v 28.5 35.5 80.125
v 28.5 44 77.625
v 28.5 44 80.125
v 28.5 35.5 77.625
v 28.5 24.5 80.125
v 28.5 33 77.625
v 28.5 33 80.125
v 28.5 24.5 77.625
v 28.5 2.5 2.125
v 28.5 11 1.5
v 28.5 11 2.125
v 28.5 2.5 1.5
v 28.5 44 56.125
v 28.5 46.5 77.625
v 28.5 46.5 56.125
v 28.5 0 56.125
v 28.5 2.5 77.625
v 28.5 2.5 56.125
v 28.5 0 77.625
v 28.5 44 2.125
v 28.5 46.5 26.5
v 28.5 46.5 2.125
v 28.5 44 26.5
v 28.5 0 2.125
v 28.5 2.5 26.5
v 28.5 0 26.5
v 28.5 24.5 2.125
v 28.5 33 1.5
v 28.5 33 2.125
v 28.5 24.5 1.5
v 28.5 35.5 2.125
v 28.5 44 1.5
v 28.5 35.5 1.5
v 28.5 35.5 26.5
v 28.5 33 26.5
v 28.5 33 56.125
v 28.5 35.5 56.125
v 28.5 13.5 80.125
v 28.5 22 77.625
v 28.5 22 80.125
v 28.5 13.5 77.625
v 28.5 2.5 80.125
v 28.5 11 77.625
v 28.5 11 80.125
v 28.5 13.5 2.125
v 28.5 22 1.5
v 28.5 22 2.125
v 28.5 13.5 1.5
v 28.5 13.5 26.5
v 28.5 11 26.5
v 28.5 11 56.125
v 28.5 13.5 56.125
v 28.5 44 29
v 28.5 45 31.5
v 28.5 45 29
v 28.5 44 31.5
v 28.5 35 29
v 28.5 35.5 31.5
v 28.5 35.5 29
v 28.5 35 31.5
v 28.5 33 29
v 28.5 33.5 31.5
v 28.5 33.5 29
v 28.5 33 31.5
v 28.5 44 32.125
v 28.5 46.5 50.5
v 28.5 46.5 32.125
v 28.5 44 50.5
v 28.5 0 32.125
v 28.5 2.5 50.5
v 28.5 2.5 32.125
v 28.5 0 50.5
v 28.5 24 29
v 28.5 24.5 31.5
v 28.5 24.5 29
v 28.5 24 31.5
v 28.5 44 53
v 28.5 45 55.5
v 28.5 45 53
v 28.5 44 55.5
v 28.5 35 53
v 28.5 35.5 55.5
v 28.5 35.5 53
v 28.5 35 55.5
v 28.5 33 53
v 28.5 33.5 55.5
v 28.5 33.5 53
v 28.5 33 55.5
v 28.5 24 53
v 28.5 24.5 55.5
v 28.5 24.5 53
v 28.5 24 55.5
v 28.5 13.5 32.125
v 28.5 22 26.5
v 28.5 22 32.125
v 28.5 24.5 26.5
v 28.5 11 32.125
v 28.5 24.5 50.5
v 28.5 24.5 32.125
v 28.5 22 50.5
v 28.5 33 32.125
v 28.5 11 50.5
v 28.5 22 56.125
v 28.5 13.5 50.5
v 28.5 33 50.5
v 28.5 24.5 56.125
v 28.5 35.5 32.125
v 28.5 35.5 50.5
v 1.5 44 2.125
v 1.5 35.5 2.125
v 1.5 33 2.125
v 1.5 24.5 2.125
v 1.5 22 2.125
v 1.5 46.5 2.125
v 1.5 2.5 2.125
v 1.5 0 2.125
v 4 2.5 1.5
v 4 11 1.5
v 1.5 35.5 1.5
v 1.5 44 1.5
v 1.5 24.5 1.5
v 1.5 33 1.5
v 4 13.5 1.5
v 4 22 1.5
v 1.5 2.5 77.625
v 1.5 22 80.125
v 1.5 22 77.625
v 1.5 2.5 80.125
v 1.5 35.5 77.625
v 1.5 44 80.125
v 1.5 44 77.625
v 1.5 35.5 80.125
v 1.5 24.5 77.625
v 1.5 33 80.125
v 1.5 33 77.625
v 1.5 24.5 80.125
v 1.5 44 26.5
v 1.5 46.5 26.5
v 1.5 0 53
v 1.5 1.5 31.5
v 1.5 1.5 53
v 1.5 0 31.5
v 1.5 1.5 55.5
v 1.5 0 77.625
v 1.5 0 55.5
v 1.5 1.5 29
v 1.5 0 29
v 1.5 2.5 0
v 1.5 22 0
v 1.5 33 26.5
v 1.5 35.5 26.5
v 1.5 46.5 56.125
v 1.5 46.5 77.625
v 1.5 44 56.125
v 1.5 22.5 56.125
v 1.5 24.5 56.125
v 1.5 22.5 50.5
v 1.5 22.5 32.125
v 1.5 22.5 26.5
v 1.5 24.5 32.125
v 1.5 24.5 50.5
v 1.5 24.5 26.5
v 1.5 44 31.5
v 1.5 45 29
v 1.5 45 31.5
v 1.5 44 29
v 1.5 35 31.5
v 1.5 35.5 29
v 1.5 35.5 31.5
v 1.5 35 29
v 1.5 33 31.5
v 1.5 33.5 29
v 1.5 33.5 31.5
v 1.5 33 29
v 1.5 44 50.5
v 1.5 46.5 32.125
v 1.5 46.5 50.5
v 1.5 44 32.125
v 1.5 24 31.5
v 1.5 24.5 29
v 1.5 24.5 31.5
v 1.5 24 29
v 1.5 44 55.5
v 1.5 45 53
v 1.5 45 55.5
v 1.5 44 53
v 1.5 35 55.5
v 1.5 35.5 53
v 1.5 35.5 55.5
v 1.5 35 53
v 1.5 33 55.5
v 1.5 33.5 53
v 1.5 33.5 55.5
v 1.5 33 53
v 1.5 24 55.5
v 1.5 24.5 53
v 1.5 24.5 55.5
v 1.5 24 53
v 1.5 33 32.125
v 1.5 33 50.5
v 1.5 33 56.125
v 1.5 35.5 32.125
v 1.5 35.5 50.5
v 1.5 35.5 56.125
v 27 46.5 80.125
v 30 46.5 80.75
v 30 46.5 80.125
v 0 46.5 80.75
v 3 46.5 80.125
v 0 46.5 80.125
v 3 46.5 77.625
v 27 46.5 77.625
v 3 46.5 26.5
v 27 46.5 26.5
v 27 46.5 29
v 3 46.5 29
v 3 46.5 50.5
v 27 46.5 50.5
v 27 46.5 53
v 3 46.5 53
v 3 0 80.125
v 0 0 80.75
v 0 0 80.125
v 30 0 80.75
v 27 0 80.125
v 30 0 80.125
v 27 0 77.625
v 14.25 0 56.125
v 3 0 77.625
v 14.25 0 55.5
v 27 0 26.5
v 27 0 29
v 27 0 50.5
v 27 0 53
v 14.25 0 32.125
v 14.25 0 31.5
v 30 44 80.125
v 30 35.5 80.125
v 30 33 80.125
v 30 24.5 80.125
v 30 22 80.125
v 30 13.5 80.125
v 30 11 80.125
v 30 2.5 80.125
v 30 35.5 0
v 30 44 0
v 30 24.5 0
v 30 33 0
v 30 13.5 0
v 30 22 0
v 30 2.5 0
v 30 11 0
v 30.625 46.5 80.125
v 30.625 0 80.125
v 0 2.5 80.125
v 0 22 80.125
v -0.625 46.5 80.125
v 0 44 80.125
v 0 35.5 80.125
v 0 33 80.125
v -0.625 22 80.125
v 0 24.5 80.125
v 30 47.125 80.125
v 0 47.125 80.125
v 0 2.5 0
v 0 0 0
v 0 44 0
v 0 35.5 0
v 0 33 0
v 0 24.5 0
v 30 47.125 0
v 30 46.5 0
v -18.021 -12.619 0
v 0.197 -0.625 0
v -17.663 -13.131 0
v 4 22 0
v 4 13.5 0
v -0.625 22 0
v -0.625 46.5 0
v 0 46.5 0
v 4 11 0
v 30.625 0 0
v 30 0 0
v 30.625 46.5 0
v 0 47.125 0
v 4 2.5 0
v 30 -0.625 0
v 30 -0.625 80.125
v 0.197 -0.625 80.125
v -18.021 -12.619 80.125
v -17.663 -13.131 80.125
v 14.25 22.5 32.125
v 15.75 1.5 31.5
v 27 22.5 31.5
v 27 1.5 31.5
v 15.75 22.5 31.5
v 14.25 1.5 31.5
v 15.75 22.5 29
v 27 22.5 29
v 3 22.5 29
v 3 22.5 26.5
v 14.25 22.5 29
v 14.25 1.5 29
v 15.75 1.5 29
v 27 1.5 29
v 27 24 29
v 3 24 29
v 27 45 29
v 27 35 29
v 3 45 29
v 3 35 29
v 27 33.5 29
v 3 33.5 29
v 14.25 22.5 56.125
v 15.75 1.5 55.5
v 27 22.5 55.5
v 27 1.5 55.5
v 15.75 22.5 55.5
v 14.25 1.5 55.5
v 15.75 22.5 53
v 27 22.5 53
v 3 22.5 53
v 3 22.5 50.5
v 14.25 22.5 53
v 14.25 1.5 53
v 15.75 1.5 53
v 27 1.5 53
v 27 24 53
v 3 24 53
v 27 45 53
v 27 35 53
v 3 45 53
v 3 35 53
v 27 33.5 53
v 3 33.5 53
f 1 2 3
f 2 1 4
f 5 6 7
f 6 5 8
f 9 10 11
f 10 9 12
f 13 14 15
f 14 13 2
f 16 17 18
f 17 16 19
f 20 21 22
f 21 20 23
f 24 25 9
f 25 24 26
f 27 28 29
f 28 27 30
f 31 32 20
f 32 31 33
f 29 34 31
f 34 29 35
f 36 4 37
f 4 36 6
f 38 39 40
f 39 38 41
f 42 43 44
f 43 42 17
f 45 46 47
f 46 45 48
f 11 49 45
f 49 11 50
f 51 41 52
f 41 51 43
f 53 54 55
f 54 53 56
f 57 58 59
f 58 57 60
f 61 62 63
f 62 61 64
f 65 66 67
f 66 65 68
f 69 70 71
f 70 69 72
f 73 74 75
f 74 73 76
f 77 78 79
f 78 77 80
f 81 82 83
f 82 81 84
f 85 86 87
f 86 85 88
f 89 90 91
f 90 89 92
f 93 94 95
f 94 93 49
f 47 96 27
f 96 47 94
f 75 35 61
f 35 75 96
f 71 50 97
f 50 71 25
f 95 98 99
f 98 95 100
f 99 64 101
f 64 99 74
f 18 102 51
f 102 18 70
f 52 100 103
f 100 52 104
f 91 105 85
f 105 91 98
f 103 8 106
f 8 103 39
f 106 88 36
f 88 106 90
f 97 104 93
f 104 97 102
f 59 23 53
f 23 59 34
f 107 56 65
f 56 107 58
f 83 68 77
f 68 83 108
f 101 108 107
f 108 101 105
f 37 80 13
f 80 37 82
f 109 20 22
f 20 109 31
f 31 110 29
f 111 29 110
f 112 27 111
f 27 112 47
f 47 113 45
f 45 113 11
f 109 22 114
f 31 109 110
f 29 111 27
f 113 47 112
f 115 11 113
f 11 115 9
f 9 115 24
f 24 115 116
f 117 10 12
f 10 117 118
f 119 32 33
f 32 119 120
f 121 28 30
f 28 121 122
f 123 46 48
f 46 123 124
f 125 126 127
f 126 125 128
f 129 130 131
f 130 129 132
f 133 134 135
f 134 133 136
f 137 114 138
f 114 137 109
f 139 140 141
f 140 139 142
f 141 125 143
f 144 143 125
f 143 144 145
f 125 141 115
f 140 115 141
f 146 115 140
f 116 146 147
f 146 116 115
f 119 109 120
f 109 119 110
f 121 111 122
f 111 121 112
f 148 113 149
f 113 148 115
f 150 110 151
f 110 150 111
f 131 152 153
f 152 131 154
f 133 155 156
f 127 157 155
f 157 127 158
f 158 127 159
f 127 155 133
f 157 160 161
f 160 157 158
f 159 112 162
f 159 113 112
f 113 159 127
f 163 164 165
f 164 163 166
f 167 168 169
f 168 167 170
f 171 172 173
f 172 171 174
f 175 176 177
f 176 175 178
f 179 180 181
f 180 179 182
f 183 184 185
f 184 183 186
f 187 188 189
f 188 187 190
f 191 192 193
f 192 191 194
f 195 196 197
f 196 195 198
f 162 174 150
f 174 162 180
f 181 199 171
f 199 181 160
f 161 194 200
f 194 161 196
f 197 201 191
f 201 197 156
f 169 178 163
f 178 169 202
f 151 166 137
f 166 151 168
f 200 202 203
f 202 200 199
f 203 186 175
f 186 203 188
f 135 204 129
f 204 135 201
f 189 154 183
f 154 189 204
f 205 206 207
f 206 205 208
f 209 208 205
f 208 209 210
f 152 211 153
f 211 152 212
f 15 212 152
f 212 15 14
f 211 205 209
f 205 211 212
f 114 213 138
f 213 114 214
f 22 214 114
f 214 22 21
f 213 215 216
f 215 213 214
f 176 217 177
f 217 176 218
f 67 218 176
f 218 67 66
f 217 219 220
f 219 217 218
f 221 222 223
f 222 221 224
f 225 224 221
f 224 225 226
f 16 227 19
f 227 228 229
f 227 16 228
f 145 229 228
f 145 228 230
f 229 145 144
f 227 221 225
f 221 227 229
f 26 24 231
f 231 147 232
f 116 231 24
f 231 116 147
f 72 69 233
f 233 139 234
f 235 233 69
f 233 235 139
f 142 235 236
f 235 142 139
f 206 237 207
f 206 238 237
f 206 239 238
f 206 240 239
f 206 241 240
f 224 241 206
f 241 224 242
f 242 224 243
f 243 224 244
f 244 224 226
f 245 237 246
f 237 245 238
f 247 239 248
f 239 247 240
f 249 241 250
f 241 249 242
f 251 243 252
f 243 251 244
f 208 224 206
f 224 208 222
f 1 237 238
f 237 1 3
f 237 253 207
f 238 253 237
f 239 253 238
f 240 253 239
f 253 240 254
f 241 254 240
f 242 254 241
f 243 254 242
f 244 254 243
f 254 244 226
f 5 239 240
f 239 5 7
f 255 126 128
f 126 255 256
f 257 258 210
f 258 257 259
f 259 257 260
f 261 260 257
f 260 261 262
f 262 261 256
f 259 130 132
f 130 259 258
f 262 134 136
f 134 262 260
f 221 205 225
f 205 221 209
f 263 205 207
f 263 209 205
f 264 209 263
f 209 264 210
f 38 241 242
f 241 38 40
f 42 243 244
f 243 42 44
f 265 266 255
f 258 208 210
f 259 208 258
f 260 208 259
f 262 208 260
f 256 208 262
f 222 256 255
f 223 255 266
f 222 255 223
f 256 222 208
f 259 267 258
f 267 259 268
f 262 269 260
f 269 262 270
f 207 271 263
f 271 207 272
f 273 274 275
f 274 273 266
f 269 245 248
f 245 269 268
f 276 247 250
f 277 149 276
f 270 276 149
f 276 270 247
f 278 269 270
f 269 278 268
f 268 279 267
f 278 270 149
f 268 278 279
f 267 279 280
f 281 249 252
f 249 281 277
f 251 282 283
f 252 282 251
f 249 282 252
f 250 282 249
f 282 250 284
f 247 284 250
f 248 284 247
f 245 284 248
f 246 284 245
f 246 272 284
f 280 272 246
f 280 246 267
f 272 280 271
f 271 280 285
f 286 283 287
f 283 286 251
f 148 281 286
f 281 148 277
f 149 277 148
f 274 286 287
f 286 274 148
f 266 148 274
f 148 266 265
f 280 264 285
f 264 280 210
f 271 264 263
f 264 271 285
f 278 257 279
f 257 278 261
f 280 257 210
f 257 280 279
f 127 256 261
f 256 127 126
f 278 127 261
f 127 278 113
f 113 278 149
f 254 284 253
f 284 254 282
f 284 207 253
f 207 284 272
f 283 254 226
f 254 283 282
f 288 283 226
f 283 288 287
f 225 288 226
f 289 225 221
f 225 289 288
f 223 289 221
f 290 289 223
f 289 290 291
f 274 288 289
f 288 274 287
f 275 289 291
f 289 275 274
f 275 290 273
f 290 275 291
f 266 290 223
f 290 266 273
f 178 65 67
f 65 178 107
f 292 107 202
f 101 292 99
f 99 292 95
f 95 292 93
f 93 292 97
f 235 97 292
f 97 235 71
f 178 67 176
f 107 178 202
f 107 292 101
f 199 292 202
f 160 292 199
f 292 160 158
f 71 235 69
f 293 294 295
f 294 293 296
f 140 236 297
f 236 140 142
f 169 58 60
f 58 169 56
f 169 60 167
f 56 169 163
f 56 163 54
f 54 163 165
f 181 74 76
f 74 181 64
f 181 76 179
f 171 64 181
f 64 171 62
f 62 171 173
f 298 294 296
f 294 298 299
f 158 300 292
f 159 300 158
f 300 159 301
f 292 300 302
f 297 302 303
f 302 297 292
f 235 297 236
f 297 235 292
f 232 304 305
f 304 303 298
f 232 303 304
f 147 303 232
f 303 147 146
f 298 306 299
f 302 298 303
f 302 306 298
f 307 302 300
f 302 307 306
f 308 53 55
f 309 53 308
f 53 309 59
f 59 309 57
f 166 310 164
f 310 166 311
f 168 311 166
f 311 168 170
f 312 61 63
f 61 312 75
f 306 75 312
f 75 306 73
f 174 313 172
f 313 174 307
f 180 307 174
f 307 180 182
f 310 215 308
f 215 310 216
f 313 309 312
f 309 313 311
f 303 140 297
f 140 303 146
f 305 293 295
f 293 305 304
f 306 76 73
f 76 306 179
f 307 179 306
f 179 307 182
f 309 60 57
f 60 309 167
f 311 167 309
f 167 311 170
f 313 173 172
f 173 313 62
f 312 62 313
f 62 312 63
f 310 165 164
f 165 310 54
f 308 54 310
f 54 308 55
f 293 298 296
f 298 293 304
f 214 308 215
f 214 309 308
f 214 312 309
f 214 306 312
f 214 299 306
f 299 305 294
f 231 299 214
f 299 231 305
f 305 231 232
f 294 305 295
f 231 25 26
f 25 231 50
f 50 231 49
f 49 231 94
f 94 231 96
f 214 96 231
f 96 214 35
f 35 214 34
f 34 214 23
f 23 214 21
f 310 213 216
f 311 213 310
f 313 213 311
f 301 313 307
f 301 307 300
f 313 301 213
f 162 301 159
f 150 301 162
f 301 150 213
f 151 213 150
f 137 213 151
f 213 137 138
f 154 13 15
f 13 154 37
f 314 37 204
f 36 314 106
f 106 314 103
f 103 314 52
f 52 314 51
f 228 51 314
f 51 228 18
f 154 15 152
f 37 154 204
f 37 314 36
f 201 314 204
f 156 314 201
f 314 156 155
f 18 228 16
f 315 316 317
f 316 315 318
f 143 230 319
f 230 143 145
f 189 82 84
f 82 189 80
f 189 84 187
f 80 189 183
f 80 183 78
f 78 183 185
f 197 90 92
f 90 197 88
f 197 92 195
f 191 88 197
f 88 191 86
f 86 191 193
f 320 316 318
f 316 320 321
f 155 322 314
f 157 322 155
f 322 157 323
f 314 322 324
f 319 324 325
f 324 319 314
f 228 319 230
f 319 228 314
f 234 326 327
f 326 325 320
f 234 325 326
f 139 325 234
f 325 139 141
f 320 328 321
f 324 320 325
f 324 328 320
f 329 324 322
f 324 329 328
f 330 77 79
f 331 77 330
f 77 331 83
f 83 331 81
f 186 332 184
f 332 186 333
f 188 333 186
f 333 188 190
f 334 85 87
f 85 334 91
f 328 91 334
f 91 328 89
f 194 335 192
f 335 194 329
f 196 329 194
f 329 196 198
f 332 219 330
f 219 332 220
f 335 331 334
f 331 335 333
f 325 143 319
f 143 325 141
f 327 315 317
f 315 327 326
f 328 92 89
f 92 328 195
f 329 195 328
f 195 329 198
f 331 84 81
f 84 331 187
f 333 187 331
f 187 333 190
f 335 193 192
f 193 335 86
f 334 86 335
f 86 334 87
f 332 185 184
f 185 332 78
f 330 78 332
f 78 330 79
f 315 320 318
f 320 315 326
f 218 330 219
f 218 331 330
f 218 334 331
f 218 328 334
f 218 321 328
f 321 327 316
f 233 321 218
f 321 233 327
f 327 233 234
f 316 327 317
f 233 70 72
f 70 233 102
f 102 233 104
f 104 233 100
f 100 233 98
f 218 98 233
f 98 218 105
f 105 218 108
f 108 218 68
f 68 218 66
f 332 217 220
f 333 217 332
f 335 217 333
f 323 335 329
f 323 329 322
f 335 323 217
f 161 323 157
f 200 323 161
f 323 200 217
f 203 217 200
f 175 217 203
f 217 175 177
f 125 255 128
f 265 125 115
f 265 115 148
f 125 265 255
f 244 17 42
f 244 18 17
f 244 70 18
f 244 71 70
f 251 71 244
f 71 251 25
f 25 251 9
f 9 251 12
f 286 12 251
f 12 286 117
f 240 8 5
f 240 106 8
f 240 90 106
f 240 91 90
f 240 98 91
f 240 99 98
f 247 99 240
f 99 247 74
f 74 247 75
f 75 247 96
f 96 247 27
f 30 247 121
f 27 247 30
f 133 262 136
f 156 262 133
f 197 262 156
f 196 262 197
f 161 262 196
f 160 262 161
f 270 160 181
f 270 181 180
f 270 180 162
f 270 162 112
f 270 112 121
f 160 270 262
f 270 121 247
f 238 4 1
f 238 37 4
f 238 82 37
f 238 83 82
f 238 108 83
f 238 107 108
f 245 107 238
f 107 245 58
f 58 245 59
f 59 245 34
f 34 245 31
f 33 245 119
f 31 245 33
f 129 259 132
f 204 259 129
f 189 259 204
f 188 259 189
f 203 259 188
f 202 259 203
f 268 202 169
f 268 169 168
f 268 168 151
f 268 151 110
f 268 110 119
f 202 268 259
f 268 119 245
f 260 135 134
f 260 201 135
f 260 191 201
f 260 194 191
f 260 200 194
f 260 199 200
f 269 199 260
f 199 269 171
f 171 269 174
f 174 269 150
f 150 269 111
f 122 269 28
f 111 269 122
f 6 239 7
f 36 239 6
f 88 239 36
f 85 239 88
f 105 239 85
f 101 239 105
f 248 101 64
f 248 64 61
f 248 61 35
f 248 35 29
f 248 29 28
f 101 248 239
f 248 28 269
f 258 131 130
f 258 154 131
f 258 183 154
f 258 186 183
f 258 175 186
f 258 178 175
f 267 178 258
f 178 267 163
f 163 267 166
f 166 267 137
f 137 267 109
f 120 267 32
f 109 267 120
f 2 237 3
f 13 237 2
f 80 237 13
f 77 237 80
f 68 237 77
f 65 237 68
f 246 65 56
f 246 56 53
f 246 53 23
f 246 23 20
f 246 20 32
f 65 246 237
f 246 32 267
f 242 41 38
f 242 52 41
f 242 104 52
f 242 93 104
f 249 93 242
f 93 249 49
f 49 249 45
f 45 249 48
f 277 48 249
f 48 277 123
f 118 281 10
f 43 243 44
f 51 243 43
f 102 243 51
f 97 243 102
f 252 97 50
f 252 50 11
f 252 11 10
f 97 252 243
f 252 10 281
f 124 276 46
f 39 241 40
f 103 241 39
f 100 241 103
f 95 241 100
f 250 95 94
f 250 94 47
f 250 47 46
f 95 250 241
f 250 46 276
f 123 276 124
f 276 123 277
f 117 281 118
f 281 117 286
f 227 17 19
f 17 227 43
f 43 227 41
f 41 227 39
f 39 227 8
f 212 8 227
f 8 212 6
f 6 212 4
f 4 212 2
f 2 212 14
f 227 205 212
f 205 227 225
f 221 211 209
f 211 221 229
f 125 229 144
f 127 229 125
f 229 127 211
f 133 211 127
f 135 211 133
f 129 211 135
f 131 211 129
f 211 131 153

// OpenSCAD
height = 80.125; // interior height is 2.125in less
show_ply = true;
show_walls = true;

module layer(layer_height) {
    
    // Beams
    translate([1.5, 0, layer_height - 3.125])
        cube([27, 1.5, 2.5]);
    translate([1.5, 22.5, layer_height - 3.125])
        cube([27, 1.5, 2.5]);
    translate([1.5, 33.5, layer_height - 3.125])
        cube([27, 1.5, 2.5]);
    translate([1.5, 45, layer_height - 3.125])
        cube([27, 1.5, 2.5]);
    
    // Crossbeams for small area
    translate([14.25, 1.5, layer_height - 3.125])
        cube([1.5, 21, 2.5]);
    translate([27, 1.5, layer_height - 3.125])
        cube([1.5, 21, 2.5]);
    
    // Plywood
    if(show_ply) {
        translate([1.5, 22.5, layer_height - 0.625])
            cube([27, 24, 0.625]);
        translate([14.25, 0, layer_height - 0.625])
            cube([14.25, 22.5, 0.625]); 
    }
        
    // Structural beams
    translate([27, 0, layer_height - 5.625])
        cube([1.5, 46.5, 2.5]);
    translate([1.5, 22.5, layer_height - 5.625])
        cube([1.5, 24, 2.5]);
}

// Left vertical beams
cube([1.5, 2.5, height]);
translate([0, 22, 0])
    cube([1.5, 2.5, height]);
translate([0, 33, 0])
    cube([1.5, 2.5, height]);
translate([0, 44, 0])
    cube([1.5, 2.5, height]);

// Right vertical beams
translate([28.5, 0, 0])
    cube([1.5, 2.5, height]);
translate([28.5, 11, 0])
    cube([1.5, 2.5, height]);
translate([28.5, 22, 0])
    cube([1.5, 2.5, height]);
translate([28.5, 33, 0])
    cube([1.5, 2.5, height]);
translate([28.5, 44, 0])
    cube([1.5, 2.5, height]);
    
// Bottom beams
translate([1.5, 0, 0])
    cube([27, 2.5, 1.5]);
translate([1.5, 2.5, 0])
    cube([2.5, 19.5, 1.5]);
translate([4, 11, 0])
    cube([24.5, 2.5, 1.5]);
translate([1.5, 22, 0])
    cube([27, 2.5, 1.5]);
translate([1.5, 33, 0])
    cube([27, 2.5, 1.5]);
translate([1.5, 44, 0])
    cube([27, 2.5, 1.5]);

// Roof support
translate([27, 0, height - 2.5])
    cube([1.5, 46.5, 2.5]);
translate([1.5, 0, height - 2.5])
    cube([1.5, 46.5, 2.5]);


if(show_ply) {
    // Floor
    translate([1.5, 0, 1.5])
        cube([27, 46.5, 0.625]);
        
    // Roof
    translate([0, 0, height])
        cube([30, 46.5, 0.625]);
}

if(show_walls) {
    // Walls
    translate([0, 46.5, 0])
        cube([30, 0.625, height]);
    translate([-0.625, 22, 0])
        cube([0.625, 24.5, height]);
    translate([30, 0, 0])
        cube([0.625, 46.5, height]);
    translate([0, -0.625, 0])
        cube([30, 0.625, height]);
    
    // Door
    rotate([0, 0, 125])
        translate([-0.625, 0, 0])
        cube([0.625, 22, height]);
}



layer(32.125);
layer(56.125);
